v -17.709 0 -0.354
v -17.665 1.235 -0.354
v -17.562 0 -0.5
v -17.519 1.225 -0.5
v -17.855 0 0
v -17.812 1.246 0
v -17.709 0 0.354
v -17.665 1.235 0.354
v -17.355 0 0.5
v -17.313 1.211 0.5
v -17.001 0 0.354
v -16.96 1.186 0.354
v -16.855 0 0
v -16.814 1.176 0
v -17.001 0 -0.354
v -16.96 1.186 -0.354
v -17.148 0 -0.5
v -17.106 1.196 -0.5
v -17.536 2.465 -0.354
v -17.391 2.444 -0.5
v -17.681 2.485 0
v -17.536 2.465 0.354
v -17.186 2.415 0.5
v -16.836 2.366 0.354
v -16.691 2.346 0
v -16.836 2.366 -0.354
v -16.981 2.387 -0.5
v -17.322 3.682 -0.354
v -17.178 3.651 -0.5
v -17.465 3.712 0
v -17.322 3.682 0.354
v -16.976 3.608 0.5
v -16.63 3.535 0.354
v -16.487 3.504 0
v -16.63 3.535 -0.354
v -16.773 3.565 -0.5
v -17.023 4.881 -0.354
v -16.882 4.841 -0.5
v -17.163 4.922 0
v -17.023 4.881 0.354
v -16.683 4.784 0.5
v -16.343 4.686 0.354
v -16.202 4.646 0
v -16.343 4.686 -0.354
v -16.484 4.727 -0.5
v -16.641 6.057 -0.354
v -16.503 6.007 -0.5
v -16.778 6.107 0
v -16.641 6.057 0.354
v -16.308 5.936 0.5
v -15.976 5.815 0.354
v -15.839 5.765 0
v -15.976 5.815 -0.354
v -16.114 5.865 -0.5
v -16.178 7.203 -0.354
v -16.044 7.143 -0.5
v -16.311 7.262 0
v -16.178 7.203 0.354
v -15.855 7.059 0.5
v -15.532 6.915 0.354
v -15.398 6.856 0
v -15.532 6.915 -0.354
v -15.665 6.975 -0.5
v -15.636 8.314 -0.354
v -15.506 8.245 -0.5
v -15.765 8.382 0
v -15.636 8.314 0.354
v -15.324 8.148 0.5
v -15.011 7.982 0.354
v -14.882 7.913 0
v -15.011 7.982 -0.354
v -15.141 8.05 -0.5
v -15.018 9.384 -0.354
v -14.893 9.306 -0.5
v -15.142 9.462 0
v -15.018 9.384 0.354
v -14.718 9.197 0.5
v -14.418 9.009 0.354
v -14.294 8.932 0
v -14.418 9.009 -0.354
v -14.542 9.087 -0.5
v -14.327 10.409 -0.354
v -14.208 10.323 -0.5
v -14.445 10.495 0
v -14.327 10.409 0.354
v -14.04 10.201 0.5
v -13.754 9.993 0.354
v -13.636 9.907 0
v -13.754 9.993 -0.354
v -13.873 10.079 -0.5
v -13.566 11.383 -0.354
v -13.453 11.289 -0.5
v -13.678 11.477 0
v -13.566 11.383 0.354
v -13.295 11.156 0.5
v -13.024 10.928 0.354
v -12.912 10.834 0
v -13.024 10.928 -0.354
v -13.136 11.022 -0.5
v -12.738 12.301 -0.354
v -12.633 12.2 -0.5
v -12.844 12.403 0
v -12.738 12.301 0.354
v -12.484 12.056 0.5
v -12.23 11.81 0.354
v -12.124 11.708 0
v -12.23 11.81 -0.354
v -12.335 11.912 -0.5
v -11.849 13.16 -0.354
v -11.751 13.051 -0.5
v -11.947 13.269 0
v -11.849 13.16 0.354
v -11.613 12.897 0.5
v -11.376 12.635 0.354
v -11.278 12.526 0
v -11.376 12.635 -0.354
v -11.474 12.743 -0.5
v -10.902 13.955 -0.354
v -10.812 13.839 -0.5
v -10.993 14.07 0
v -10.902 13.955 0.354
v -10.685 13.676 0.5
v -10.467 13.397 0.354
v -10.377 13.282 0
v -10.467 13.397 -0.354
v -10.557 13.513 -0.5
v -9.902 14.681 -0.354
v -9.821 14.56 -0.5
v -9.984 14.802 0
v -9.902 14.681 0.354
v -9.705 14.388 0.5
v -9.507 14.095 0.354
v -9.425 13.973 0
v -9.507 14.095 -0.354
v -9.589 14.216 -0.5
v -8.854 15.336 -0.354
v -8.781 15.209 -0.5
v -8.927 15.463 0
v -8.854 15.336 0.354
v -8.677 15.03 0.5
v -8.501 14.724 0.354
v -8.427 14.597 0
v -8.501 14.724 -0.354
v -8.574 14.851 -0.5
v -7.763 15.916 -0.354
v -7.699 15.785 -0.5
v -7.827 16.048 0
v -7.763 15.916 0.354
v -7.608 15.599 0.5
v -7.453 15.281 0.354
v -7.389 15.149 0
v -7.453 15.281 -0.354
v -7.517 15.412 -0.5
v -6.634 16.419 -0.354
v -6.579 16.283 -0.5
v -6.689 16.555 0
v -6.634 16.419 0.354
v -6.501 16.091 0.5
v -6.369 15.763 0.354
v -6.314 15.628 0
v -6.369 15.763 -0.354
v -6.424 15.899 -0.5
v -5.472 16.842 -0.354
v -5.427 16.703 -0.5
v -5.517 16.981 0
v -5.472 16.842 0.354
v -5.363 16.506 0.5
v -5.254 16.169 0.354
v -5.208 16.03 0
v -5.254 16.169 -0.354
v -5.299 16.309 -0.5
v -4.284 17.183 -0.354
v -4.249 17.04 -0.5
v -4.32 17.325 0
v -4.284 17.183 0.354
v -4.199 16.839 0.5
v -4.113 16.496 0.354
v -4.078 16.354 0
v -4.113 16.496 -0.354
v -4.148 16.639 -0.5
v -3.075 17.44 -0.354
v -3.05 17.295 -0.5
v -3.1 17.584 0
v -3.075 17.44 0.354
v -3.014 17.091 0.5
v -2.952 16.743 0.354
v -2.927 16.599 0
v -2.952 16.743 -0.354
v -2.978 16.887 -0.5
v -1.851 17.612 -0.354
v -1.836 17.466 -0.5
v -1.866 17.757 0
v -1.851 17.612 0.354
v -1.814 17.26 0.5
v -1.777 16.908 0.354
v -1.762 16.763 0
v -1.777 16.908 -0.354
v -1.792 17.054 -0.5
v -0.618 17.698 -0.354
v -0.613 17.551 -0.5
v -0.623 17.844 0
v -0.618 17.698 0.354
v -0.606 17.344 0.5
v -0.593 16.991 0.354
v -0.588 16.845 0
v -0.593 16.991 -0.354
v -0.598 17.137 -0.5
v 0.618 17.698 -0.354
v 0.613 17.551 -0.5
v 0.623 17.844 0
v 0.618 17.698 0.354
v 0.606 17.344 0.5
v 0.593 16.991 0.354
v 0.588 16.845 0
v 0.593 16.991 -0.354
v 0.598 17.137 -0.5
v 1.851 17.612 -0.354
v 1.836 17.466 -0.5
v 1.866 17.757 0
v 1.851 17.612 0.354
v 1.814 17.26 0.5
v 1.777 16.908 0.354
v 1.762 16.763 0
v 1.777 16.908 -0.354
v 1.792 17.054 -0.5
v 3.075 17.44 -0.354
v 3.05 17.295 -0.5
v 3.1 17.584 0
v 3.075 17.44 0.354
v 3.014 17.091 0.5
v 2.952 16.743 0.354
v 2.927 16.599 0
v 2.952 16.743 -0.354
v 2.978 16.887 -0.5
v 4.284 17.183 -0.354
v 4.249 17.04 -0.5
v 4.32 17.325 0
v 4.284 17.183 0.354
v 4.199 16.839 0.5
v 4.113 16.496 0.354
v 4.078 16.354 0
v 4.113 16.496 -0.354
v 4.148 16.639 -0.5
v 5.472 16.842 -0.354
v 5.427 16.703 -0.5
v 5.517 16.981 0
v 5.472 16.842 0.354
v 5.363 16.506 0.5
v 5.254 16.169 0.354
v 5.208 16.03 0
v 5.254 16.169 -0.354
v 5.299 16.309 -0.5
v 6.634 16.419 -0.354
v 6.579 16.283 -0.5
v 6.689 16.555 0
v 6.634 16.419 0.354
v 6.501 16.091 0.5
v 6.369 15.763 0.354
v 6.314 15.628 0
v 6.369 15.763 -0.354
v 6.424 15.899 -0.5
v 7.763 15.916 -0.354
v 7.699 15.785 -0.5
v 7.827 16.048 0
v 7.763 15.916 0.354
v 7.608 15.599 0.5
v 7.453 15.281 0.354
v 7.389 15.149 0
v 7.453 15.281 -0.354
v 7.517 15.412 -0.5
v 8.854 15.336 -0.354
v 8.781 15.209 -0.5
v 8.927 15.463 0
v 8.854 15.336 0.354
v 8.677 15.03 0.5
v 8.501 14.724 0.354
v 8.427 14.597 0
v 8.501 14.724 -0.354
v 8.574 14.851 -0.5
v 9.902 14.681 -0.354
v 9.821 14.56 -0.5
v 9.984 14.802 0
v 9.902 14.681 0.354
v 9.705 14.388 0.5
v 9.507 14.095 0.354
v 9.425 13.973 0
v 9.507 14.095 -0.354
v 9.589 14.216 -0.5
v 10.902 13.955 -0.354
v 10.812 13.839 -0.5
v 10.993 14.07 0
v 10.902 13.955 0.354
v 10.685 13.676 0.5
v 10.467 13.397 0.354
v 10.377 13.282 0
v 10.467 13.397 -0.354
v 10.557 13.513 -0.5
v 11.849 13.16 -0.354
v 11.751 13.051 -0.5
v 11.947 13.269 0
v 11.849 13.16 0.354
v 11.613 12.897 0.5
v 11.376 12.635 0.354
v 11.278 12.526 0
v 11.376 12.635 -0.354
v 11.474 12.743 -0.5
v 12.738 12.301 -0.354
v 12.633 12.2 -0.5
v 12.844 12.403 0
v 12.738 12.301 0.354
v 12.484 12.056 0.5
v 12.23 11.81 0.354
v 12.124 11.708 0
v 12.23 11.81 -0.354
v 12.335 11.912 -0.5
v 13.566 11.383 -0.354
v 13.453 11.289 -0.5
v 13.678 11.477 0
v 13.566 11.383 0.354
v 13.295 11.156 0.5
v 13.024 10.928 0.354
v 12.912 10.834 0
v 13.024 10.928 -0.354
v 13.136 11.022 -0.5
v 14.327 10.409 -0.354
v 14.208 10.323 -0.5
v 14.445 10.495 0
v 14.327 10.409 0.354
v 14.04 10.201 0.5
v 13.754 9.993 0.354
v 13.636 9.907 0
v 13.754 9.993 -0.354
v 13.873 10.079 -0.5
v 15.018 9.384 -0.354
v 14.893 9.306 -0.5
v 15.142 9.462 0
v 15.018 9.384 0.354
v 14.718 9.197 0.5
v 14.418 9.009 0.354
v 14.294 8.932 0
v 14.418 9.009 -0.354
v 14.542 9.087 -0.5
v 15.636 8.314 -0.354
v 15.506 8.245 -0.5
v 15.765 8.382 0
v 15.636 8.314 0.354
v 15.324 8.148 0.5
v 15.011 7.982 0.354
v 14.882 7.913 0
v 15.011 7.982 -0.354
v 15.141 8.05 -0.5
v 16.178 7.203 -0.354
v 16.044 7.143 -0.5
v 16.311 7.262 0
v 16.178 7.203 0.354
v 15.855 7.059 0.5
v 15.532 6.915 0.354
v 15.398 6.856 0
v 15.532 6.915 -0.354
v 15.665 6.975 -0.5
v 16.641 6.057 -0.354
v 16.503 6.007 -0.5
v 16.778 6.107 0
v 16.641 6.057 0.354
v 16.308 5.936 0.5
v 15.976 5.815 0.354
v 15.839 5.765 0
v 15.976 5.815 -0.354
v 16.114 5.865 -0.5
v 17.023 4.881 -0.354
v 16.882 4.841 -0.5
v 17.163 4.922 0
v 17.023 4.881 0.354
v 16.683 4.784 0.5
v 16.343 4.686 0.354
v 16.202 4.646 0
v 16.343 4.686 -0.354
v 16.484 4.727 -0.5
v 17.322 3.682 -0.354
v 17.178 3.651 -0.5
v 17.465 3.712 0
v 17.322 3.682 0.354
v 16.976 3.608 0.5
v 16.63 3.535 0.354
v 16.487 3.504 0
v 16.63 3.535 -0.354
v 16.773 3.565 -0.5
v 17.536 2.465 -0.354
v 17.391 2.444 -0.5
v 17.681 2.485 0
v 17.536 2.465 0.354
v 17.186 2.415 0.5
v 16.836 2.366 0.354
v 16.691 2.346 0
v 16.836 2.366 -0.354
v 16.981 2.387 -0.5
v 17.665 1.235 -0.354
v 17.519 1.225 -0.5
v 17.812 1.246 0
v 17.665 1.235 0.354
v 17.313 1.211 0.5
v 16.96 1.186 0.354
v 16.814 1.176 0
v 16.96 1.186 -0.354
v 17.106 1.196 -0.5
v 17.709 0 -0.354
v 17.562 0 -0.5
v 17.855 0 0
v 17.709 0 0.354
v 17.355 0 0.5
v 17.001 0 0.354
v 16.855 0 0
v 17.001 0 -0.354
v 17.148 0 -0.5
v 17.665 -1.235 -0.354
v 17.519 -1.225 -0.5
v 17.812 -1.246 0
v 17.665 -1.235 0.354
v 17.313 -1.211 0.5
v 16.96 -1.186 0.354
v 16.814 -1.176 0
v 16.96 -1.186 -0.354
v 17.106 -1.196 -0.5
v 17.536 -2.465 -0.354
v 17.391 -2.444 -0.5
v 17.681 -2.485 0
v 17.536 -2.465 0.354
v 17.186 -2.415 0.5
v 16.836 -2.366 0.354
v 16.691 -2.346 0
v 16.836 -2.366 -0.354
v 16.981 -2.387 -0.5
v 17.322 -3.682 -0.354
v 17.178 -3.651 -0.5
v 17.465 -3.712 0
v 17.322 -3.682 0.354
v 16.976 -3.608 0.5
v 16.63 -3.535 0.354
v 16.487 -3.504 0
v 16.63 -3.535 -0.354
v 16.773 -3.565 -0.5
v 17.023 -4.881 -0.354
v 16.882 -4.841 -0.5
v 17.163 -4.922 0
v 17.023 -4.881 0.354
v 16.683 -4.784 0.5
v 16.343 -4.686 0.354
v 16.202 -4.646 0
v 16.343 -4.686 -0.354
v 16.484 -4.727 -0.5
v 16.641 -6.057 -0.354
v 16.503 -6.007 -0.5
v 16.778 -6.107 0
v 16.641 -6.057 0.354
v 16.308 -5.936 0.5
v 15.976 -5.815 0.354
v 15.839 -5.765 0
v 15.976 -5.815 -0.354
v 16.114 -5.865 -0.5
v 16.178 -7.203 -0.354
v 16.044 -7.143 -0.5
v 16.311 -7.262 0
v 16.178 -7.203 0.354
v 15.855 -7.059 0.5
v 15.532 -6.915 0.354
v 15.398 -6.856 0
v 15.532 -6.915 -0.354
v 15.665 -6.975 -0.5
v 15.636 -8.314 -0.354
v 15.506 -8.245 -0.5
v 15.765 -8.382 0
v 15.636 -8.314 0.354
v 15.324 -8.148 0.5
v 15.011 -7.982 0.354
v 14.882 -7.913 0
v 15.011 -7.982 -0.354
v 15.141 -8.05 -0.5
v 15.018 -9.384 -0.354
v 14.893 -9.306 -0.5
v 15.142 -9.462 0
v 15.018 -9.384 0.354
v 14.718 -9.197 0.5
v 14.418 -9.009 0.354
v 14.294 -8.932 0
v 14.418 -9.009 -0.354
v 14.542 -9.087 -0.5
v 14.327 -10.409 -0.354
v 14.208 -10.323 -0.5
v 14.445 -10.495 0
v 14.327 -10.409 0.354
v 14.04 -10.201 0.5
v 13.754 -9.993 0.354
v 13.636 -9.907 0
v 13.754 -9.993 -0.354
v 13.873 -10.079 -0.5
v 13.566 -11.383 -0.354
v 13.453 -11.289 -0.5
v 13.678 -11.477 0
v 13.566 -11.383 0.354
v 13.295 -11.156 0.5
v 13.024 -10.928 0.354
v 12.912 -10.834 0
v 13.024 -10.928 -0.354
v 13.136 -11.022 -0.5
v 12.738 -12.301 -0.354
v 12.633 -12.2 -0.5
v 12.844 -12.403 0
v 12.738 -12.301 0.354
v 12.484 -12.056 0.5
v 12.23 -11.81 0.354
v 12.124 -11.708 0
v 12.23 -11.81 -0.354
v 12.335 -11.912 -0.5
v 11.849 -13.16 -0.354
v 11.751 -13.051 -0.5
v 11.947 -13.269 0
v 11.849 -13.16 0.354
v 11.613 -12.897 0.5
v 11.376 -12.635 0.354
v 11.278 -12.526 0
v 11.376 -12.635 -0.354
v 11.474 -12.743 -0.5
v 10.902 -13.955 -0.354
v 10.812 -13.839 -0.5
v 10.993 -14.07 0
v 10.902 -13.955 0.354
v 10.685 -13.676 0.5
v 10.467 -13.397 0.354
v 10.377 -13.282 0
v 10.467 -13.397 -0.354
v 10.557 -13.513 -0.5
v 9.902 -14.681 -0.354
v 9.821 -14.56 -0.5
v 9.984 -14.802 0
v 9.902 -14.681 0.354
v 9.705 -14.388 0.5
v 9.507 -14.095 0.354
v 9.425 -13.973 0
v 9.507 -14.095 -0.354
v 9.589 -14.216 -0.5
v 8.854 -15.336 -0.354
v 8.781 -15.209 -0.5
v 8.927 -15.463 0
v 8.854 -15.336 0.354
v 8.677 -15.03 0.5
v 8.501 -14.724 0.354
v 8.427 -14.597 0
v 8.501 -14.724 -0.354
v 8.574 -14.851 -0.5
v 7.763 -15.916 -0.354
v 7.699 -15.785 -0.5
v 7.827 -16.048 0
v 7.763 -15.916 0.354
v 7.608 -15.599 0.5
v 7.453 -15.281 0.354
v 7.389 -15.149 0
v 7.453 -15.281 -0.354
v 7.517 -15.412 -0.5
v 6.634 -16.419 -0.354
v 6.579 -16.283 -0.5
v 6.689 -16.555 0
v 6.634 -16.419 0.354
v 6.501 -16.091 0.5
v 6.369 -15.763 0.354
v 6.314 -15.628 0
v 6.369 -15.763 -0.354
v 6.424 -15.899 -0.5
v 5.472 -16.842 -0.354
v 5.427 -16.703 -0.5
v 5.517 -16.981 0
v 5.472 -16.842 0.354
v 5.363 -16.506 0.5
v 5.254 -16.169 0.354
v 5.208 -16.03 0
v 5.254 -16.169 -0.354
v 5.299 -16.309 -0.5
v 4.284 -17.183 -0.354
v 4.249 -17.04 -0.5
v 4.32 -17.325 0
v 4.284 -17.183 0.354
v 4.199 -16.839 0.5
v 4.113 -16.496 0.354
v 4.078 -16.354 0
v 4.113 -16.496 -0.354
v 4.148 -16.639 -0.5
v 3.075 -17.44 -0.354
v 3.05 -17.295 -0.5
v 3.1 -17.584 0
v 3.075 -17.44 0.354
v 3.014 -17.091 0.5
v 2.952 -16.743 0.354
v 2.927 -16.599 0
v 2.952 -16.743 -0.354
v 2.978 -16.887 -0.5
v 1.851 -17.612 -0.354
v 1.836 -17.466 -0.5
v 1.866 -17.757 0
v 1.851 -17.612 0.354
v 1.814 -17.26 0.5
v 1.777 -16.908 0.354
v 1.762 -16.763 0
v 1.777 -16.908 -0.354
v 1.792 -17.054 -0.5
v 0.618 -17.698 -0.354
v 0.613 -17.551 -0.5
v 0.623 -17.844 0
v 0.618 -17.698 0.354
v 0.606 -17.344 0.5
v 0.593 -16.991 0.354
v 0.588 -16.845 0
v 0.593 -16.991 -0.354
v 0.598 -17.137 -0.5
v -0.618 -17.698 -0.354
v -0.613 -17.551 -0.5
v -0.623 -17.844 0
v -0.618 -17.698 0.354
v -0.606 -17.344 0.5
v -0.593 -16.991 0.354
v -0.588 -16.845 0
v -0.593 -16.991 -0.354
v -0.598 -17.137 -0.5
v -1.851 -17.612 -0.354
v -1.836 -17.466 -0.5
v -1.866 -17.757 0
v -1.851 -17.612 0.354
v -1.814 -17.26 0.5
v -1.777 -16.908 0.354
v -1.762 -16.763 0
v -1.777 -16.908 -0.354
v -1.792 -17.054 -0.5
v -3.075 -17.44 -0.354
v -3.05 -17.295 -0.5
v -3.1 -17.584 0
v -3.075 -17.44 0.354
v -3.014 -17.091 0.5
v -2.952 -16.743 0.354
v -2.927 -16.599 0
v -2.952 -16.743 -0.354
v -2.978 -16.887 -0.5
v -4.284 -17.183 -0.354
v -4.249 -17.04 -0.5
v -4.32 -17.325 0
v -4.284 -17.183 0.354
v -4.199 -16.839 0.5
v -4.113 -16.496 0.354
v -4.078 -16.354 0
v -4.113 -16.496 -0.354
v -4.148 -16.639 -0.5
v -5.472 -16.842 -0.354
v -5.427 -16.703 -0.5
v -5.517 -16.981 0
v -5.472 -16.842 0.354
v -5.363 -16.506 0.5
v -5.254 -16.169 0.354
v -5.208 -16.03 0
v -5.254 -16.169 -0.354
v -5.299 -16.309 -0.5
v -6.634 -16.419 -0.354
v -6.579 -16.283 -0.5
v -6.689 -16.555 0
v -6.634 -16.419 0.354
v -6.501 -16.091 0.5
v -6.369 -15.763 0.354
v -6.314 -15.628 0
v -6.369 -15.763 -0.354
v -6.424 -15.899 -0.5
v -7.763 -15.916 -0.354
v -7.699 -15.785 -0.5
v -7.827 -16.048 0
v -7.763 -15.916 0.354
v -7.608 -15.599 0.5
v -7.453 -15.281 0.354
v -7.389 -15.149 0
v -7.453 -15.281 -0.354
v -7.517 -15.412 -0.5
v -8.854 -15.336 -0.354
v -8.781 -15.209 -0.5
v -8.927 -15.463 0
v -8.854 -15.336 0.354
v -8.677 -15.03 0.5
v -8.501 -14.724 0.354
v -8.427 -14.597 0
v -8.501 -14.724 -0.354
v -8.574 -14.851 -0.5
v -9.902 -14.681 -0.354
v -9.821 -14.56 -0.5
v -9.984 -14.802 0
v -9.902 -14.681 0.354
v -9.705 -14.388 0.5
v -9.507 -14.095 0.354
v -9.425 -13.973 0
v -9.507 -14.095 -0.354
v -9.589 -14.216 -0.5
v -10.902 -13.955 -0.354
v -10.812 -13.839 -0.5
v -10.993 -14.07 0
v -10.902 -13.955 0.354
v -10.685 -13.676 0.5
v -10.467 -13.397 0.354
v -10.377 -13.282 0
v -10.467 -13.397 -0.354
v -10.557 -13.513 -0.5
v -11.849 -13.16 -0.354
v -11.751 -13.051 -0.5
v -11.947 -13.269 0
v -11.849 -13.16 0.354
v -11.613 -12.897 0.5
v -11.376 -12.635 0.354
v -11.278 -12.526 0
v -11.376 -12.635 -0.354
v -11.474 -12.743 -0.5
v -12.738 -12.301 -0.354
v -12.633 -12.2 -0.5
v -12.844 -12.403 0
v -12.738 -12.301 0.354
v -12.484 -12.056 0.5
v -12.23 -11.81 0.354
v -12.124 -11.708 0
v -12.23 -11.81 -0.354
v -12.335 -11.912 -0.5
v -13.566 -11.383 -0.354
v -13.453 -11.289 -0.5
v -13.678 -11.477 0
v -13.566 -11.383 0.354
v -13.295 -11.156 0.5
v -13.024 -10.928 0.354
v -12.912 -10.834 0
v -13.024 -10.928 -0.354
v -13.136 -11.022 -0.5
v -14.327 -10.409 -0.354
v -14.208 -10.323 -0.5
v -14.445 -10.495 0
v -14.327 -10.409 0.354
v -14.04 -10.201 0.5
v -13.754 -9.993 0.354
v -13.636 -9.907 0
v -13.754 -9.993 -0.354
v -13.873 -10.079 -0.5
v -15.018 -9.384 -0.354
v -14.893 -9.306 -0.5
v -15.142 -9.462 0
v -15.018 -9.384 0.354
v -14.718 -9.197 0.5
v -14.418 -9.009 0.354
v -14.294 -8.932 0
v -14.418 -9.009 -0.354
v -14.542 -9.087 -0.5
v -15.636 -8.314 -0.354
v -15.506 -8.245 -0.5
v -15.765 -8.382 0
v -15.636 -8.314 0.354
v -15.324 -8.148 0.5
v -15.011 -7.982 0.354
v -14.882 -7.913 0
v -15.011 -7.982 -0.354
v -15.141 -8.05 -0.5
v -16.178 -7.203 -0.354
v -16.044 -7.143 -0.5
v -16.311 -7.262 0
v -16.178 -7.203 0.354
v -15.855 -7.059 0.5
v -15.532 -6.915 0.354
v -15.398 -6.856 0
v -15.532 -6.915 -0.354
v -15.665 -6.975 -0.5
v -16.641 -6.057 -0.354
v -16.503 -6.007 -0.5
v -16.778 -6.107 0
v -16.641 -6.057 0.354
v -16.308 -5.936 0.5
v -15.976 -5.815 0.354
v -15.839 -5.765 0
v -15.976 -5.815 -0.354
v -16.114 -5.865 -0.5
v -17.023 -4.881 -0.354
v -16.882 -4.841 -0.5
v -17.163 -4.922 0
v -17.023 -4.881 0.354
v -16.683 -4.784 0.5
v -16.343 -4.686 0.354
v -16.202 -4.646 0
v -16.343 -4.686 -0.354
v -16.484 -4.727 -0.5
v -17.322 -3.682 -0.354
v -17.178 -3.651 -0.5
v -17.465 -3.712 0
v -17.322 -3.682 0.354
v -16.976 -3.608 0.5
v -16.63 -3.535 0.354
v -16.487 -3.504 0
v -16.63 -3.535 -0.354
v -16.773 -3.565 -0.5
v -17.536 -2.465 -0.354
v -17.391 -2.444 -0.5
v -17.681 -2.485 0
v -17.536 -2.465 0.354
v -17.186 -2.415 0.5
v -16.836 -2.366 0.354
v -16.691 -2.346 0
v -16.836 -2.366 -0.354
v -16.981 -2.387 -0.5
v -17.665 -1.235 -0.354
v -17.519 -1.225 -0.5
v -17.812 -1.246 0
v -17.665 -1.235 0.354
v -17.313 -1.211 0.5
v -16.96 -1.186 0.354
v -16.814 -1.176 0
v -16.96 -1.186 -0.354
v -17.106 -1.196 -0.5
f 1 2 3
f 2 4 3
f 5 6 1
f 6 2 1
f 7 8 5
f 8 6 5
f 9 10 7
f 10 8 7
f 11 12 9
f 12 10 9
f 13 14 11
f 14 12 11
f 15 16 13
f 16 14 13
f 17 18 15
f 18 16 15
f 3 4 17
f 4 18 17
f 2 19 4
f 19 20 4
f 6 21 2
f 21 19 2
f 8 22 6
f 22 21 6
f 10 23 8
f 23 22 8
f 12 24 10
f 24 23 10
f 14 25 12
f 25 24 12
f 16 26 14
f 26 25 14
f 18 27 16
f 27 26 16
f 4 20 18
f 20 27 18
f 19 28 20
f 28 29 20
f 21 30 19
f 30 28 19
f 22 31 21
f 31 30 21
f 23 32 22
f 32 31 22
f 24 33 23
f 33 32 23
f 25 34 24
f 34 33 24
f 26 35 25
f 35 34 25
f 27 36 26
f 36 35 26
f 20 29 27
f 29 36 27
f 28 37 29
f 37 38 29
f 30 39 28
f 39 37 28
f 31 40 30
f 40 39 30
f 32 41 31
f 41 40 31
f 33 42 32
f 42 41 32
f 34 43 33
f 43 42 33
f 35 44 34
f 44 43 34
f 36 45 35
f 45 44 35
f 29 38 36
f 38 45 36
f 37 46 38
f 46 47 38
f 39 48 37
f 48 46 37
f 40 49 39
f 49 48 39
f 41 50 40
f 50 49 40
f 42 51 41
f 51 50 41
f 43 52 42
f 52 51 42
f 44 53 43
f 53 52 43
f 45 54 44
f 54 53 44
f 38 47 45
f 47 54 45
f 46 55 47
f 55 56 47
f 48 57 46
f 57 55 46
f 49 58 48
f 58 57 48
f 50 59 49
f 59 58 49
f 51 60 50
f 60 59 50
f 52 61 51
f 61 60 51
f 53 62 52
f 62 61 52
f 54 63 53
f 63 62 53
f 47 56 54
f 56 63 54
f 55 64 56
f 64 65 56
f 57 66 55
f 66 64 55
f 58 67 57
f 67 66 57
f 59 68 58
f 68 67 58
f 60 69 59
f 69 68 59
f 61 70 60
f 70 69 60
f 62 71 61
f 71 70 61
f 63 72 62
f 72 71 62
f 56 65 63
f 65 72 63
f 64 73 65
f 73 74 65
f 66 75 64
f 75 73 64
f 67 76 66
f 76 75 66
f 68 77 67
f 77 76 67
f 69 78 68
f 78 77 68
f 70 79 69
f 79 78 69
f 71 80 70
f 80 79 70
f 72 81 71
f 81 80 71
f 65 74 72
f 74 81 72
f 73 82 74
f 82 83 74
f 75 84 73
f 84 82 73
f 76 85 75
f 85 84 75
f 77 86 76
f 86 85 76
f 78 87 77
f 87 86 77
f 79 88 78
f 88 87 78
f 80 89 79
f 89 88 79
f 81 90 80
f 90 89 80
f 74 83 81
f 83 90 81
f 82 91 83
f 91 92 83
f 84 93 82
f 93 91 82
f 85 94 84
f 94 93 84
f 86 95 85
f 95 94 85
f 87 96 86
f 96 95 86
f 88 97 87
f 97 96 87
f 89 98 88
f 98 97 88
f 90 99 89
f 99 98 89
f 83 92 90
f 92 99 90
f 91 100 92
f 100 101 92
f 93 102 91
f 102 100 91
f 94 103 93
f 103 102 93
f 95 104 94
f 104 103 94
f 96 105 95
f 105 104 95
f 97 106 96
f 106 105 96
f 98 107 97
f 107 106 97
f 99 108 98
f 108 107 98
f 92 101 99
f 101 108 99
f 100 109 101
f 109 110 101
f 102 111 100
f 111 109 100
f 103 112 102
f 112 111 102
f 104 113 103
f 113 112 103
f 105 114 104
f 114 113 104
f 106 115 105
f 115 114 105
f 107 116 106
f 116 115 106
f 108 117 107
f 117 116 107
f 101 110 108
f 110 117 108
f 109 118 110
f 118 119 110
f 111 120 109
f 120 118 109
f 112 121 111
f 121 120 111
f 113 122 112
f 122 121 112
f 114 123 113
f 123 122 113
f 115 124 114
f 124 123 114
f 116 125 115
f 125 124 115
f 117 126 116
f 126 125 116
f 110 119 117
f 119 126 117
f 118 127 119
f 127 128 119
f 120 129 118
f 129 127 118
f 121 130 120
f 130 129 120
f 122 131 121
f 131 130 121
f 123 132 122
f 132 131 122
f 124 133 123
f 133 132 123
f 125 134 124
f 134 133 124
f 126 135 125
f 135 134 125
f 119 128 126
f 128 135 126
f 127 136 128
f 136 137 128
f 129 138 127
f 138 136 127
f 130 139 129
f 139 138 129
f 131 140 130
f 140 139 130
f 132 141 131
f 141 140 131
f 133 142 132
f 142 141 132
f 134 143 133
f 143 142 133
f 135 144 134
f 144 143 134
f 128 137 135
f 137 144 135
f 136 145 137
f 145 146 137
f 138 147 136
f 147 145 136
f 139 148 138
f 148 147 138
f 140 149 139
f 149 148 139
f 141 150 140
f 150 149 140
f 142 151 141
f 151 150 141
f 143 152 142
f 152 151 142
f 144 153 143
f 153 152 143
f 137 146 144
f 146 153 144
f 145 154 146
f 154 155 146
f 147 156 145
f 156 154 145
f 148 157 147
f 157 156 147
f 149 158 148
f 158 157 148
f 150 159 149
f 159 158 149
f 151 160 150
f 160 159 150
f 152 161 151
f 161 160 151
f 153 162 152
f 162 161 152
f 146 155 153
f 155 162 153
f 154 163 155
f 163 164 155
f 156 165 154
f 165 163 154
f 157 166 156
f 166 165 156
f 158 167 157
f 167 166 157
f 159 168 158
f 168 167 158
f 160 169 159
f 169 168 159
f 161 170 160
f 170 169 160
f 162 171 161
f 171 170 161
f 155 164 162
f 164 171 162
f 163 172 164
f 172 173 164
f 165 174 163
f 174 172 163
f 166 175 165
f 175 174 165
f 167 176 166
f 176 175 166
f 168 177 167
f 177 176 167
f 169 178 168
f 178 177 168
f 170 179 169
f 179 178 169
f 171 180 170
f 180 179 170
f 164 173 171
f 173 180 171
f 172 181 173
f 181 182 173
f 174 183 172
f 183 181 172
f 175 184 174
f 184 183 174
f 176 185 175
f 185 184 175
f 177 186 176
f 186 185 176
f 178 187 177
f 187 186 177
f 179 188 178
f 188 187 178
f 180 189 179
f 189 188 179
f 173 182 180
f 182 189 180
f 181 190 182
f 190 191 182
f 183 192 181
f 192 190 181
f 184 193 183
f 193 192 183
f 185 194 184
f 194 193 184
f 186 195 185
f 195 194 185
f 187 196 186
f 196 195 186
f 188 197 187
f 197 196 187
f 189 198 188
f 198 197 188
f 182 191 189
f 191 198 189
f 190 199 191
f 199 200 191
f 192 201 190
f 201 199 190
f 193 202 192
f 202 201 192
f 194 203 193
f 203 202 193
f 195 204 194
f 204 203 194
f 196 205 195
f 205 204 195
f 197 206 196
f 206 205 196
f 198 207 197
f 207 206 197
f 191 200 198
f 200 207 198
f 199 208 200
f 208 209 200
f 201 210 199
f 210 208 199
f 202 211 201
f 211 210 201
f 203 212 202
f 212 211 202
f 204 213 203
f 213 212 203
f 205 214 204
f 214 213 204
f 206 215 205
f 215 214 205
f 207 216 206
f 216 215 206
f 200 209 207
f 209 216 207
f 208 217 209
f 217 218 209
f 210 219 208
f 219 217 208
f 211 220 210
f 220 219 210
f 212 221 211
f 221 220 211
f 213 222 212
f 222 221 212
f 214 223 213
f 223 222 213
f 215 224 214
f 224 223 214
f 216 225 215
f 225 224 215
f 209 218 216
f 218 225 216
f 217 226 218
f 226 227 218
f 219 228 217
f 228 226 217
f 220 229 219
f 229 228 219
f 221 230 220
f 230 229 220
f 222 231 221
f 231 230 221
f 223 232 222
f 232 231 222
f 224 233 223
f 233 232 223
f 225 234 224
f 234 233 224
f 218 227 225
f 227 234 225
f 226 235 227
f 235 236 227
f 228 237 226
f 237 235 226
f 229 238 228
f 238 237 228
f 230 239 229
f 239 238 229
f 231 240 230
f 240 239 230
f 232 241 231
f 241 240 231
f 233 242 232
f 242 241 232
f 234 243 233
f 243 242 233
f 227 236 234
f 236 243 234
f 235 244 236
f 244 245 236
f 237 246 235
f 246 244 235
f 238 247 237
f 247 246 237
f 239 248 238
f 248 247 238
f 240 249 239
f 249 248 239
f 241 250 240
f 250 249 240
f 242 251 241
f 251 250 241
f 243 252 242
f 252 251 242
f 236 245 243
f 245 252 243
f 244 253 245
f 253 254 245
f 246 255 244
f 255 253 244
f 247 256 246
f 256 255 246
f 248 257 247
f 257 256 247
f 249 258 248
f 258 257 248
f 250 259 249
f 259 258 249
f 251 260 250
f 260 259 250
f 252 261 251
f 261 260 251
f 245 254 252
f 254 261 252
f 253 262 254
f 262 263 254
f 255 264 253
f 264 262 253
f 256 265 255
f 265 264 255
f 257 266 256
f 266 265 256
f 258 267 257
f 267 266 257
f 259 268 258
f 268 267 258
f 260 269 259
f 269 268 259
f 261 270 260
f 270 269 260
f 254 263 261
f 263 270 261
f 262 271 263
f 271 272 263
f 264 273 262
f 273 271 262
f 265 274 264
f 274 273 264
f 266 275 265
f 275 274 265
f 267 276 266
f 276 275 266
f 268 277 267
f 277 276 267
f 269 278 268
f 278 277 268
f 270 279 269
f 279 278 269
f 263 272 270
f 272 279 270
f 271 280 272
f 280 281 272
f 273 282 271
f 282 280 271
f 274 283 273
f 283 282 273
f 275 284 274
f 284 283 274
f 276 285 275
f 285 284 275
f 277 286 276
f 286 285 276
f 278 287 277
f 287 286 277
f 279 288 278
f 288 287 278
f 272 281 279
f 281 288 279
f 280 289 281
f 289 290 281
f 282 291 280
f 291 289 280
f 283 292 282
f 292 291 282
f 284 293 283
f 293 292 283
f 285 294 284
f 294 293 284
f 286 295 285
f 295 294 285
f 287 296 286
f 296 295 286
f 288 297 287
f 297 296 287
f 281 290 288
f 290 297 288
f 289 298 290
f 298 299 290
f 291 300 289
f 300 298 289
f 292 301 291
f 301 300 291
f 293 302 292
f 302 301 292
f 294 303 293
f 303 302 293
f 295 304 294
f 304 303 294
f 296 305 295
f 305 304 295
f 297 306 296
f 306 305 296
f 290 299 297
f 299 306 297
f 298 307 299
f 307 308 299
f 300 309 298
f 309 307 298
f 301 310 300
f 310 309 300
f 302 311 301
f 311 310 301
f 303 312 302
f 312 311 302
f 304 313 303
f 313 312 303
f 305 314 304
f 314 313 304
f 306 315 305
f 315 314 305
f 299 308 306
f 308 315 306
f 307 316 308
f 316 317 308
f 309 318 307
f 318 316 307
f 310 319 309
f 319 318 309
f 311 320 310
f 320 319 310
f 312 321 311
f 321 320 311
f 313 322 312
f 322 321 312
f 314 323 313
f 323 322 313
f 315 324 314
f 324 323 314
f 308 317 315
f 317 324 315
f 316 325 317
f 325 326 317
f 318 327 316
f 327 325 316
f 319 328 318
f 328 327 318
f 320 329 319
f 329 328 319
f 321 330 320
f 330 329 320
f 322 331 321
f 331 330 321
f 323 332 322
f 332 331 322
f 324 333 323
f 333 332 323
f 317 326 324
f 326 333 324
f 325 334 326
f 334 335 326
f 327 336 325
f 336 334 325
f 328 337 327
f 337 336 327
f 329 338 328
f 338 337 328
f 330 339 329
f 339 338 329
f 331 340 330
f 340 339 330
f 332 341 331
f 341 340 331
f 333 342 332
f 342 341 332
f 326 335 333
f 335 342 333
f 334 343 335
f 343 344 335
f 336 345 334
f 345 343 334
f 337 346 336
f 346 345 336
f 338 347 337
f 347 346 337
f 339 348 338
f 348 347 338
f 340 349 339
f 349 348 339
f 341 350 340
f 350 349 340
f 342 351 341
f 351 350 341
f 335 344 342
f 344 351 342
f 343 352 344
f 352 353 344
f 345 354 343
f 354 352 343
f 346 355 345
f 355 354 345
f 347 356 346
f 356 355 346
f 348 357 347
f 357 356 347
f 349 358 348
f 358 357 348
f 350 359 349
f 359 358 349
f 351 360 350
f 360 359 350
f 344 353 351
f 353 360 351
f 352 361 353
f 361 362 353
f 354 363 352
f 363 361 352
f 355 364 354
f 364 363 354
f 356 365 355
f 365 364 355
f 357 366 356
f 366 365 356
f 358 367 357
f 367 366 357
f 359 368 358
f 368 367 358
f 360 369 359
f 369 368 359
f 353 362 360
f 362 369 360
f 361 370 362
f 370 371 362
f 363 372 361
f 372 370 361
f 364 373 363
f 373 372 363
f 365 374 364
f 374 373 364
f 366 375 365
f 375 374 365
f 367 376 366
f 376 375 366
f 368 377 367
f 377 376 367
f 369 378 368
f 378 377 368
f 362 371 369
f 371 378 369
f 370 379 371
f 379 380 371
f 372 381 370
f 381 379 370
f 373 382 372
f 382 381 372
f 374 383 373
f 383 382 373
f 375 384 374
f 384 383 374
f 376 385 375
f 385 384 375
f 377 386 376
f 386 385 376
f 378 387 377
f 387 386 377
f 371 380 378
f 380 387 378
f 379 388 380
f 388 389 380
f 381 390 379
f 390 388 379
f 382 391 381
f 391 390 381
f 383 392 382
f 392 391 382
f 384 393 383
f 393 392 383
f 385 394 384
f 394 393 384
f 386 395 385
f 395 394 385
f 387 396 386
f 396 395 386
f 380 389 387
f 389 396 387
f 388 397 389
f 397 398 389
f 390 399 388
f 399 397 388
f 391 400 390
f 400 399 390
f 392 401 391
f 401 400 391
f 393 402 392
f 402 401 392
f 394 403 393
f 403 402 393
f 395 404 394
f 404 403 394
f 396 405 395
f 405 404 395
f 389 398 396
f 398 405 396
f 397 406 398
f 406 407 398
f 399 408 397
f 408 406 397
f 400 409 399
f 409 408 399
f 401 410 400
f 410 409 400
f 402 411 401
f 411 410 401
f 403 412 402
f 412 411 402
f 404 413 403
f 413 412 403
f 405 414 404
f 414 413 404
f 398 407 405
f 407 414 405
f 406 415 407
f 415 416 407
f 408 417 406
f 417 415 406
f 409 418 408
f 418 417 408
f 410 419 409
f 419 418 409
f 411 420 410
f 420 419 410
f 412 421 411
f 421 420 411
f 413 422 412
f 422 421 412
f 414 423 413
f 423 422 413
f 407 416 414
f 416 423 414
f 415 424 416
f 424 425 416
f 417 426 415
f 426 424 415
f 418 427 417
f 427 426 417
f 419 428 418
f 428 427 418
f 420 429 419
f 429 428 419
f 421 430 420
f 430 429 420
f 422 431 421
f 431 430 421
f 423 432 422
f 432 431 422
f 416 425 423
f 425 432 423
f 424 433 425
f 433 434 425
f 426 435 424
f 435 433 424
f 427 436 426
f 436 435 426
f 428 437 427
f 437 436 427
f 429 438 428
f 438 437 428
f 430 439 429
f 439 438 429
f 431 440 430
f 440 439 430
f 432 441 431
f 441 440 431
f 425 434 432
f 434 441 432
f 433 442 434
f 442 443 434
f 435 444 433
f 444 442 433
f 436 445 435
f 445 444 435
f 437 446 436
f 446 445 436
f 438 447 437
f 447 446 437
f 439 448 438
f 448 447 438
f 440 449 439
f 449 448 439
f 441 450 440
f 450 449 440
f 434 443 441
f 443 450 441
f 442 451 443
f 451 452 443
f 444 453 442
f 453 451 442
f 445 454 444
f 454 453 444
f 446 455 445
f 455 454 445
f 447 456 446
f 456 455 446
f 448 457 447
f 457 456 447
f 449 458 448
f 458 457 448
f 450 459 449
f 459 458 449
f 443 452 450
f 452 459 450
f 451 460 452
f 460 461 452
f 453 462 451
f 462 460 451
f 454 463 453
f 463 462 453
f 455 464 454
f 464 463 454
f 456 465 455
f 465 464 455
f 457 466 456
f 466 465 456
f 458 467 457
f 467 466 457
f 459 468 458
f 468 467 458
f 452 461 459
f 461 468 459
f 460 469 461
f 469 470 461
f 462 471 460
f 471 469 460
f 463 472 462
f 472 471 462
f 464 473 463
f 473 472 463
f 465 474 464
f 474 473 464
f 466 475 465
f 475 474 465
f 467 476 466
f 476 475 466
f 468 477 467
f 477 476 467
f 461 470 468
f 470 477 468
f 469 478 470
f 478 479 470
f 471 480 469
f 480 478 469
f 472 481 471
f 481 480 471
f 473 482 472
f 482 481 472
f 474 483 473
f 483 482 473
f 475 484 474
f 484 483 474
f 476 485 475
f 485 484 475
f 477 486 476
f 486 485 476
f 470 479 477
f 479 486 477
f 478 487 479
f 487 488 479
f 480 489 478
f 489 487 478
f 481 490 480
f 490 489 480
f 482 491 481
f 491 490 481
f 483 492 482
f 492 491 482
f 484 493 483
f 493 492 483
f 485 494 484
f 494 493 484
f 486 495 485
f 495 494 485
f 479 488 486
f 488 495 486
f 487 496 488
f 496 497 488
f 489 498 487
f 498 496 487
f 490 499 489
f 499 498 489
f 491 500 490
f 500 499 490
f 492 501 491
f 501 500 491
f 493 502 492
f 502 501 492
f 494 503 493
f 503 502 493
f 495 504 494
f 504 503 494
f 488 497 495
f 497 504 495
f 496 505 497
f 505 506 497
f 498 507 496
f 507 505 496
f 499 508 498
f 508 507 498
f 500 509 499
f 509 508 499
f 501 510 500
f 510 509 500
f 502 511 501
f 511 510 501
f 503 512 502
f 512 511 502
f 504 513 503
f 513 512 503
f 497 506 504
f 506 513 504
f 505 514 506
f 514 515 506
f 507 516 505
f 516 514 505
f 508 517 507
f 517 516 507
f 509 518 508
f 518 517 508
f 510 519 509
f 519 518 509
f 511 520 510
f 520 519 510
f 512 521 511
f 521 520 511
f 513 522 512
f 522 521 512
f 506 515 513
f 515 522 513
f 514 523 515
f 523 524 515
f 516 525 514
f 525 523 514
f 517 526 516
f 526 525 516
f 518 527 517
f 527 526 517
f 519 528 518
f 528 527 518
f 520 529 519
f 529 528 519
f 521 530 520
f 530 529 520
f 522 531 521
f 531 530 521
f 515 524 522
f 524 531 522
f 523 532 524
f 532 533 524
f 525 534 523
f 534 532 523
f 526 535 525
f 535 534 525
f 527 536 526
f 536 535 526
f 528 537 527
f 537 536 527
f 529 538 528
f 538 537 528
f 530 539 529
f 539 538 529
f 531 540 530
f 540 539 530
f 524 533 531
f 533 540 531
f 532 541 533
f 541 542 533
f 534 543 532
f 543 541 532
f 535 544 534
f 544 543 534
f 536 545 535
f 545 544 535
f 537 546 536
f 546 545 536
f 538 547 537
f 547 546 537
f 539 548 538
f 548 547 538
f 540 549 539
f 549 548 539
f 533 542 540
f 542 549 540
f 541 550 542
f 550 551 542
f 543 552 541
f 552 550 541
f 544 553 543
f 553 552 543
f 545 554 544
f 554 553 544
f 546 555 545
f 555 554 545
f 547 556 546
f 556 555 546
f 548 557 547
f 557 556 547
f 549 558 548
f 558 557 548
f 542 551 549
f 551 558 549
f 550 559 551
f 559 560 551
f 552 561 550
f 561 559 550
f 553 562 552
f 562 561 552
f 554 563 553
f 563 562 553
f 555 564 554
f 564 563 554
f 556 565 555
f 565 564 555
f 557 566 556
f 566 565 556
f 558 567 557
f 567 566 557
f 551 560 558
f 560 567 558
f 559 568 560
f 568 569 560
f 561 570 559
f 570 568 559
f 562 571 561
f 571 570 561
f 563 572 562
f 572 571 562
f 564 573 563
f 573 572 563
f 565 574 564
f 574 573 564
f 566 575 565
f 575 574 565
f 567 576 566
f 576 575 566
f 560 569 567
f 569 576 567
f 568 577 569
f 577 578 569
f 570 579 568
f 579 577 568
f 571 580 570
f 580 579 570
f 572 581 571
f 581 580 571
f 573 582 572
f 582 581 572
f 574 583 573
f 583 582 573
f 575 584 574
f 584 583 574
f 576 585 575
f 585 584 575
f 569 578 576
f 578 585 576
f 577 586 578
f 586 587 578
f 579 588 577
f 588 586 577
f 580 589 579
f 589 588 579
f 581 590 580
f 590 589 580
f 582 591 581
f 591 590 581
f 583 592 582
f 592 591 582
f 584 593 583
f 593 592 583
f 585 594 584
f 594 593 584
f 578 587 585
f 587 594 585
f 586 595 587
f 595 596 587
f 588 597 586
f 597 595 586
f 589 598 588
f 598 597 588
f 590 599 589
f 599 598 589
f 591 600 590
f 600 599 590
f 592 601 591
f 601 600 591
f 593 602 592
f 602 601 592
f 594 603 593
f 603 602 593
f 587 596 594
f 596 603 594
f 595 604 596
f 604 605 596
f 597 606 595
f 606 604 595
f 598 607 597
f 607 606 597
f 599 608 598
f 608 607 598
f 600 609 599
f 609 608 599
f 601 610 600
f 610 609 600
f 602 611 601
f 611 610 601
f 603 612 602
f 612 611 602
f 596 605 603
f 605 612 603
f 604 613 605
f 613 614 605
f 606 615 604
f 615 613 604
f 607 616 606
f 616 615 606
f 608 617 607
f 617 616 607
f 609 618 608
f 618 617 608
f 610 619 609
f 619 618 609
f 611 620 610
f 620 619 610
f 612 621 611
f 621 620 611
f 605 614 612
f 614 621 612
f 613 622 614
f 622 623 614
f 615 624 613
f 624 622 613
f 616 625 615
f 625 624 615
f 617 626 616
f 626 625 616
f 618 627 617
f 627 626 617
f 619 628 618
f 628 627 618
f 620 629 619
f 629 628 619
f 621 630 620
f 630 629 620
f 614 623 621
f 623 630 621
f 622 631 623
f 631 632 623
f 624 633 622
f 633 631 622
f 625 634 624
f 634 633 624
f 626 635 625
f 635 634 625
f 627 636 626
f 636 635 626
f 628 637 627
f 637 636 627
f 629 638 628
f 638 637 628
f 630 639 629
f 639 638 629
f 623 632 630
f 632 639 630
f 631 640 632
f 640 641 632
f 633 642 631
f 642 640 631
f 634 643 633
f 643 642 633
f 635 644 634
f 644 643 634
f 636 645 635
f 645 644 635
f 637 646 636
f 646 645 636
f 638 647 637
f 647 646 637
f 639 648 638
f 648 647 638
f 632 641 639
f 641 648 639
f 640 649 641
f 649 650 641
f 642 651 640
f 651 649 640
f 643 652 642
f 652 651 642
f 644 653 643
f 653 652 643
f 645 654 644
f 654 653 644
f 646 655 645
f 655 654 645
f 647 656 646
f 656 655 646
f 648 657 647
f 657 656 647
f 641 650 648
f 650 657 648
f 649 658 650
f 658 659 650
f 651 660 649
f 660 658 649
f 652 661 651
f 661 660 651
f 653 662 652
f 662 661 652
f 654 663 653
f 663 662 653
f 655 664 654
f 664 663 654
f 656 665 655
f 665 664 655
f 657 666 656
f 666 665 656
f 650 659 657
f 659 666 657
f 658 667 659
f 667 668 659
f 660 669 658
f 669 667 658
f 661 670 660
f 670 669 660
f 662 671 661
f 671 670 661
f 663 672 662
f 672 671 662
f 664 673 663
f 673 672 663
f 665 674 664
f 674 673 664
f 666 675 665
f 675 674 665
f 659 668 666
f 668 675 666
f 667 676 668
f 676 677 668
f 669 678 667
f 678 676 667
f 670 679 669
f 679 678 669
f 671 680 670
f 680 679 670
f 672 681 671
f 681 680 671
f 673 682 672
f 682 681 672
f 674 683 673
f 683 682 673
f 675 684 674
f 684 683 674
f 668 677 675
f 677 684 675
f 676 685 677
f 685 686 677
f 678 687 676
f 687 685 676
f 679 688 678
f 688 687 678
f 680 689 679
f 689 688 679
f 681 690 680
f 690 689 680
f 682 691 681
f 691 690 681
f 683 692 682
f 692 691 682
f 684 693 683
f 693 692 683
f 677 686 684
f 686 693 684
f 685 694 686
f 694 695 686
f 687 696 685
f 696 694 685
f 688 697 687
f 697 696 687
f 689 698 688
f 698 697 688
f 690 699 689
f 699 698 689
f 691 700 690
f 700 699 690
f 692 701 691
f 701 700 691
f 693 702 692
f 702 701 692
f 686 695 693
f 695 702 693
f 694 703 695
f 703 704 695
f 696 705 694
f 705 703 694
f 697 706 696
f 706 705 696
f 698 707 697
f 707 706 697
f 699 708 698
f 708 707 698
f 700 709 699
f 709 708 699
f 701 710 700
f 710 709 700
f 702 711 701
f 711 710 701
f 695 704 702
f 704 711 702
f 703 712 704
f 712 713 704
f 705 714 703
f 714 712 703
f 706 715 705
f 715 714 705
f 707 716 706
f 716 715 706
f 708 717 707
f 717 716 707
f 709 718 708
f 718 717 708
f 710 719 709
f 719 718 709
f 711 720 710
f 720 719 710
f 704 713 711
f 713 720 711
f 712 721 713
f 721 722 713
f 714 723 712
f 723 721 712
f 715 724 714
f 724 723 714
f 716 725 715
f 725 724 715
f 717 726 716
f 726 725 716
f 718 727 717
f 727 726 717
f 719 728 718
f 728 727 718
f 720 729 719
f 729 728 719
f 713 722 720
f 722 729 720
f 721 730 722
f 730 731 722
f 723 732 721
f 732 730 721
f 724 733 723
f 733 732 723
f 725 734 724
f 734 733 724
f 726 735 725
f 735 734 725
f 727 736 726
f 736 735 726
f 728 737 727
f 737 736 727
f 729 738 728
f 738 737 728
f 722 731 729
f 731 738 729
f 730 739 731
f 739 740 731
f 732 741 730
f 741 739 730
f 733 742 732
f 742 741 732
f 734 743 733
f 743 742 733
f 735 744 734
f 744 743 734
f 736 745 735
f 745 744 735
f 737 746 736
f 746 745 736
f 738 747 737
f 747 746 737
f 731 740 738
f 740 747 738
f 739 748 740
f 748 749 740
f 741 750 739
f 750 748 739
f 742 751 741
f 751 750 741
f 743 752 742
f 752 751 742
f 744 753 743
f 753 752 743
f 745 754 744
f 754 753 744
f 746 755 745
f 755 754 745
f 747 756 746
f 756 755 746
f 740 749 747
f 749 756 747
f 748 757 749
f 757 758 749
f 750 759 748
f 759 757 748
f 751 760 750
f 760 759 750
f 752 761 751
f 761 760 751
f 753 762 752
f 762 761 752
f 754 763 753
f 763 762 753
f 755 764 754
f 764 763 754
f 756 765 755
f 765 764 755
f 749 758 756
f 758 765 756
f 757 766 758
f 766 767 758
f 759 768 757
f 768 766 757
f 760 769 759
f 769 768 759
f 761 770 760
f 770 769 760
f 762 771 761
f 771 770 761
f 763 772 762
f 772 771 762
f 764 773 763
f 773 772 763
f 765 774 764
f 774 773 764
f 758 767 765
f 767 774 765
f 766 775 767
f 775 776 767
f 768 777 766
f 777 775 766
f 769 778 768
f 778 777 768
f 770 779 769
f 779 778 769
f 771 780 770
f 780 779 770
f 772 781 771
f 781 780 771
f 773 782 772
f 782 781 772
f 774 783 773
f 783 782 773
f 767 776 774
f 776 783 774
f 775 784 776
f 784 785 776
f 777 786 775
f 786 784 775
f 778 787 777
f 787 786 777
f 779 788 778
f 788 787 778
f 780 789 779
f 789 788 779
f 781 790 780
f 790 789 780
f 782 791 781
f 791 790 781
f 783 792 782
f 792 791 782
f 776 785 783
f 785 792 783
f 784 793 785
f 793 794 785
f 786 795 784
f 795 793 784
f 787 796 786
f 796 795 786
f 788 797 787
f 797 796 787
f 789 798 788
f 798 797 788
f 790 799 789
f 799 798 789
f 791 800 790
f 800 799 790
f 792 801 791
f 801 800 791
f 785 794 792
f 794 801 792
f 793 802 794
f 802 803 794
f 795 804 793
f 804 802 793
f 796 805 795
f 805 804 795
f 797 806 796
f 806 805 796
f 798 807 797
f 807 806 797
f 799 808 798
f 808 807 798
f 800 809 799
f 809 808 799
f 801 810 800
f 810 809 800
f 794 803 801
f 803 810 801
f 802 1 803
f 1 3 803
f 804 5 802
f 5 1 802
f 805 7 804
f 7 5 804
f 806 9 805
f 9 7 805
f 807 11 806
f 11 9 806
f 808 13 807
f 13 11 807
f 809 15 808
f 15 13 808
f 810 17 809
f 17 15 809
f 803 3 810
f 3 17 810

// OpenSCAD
// Printable, customizable o-ring
Inner_Diameter = 33.71;
Outer_Diameter = 35.71;
Type="O-ring"; //[Gasket,O-ring]
// lower for a rounder ring
$fa=4;
/* [O-ring] */
// maxium overhang degrees. Useful for printing without supports. 90 for circular profile. 0 for vertical sides. 
Max_Overhang = 45; 
// lower for a rounder profile
$fs=0.4; //[0.1:0.1:5]
/* [Gasket] */
Thickness = 0.61;

R = (Outer_Diameter + Inner_Diameter)/4;

r = abs(Outer_Diameter - Inner_Diameter)/4;

module printable_circle(r, overhang=45) {
    n = [r * cos(overhang), r * (1 - sin(overhang))];
    m = [n.x - n.y * tan(overhang), 0];
    circle(r);
    translate([0, -r]) polygon([-m, m, n, [-n.x, n.y]]);
}

if (Type == "O-ring") {
    rotate_extrude(angle=360)
        translate([R, 0]) 
        printable_circle(r, Max_Overhang);
} else {
    // gasket
    rotate_extrude(angle=360)
        translate([R, 0]) 
        square([2*r, Thickness], center=true);
}
    
